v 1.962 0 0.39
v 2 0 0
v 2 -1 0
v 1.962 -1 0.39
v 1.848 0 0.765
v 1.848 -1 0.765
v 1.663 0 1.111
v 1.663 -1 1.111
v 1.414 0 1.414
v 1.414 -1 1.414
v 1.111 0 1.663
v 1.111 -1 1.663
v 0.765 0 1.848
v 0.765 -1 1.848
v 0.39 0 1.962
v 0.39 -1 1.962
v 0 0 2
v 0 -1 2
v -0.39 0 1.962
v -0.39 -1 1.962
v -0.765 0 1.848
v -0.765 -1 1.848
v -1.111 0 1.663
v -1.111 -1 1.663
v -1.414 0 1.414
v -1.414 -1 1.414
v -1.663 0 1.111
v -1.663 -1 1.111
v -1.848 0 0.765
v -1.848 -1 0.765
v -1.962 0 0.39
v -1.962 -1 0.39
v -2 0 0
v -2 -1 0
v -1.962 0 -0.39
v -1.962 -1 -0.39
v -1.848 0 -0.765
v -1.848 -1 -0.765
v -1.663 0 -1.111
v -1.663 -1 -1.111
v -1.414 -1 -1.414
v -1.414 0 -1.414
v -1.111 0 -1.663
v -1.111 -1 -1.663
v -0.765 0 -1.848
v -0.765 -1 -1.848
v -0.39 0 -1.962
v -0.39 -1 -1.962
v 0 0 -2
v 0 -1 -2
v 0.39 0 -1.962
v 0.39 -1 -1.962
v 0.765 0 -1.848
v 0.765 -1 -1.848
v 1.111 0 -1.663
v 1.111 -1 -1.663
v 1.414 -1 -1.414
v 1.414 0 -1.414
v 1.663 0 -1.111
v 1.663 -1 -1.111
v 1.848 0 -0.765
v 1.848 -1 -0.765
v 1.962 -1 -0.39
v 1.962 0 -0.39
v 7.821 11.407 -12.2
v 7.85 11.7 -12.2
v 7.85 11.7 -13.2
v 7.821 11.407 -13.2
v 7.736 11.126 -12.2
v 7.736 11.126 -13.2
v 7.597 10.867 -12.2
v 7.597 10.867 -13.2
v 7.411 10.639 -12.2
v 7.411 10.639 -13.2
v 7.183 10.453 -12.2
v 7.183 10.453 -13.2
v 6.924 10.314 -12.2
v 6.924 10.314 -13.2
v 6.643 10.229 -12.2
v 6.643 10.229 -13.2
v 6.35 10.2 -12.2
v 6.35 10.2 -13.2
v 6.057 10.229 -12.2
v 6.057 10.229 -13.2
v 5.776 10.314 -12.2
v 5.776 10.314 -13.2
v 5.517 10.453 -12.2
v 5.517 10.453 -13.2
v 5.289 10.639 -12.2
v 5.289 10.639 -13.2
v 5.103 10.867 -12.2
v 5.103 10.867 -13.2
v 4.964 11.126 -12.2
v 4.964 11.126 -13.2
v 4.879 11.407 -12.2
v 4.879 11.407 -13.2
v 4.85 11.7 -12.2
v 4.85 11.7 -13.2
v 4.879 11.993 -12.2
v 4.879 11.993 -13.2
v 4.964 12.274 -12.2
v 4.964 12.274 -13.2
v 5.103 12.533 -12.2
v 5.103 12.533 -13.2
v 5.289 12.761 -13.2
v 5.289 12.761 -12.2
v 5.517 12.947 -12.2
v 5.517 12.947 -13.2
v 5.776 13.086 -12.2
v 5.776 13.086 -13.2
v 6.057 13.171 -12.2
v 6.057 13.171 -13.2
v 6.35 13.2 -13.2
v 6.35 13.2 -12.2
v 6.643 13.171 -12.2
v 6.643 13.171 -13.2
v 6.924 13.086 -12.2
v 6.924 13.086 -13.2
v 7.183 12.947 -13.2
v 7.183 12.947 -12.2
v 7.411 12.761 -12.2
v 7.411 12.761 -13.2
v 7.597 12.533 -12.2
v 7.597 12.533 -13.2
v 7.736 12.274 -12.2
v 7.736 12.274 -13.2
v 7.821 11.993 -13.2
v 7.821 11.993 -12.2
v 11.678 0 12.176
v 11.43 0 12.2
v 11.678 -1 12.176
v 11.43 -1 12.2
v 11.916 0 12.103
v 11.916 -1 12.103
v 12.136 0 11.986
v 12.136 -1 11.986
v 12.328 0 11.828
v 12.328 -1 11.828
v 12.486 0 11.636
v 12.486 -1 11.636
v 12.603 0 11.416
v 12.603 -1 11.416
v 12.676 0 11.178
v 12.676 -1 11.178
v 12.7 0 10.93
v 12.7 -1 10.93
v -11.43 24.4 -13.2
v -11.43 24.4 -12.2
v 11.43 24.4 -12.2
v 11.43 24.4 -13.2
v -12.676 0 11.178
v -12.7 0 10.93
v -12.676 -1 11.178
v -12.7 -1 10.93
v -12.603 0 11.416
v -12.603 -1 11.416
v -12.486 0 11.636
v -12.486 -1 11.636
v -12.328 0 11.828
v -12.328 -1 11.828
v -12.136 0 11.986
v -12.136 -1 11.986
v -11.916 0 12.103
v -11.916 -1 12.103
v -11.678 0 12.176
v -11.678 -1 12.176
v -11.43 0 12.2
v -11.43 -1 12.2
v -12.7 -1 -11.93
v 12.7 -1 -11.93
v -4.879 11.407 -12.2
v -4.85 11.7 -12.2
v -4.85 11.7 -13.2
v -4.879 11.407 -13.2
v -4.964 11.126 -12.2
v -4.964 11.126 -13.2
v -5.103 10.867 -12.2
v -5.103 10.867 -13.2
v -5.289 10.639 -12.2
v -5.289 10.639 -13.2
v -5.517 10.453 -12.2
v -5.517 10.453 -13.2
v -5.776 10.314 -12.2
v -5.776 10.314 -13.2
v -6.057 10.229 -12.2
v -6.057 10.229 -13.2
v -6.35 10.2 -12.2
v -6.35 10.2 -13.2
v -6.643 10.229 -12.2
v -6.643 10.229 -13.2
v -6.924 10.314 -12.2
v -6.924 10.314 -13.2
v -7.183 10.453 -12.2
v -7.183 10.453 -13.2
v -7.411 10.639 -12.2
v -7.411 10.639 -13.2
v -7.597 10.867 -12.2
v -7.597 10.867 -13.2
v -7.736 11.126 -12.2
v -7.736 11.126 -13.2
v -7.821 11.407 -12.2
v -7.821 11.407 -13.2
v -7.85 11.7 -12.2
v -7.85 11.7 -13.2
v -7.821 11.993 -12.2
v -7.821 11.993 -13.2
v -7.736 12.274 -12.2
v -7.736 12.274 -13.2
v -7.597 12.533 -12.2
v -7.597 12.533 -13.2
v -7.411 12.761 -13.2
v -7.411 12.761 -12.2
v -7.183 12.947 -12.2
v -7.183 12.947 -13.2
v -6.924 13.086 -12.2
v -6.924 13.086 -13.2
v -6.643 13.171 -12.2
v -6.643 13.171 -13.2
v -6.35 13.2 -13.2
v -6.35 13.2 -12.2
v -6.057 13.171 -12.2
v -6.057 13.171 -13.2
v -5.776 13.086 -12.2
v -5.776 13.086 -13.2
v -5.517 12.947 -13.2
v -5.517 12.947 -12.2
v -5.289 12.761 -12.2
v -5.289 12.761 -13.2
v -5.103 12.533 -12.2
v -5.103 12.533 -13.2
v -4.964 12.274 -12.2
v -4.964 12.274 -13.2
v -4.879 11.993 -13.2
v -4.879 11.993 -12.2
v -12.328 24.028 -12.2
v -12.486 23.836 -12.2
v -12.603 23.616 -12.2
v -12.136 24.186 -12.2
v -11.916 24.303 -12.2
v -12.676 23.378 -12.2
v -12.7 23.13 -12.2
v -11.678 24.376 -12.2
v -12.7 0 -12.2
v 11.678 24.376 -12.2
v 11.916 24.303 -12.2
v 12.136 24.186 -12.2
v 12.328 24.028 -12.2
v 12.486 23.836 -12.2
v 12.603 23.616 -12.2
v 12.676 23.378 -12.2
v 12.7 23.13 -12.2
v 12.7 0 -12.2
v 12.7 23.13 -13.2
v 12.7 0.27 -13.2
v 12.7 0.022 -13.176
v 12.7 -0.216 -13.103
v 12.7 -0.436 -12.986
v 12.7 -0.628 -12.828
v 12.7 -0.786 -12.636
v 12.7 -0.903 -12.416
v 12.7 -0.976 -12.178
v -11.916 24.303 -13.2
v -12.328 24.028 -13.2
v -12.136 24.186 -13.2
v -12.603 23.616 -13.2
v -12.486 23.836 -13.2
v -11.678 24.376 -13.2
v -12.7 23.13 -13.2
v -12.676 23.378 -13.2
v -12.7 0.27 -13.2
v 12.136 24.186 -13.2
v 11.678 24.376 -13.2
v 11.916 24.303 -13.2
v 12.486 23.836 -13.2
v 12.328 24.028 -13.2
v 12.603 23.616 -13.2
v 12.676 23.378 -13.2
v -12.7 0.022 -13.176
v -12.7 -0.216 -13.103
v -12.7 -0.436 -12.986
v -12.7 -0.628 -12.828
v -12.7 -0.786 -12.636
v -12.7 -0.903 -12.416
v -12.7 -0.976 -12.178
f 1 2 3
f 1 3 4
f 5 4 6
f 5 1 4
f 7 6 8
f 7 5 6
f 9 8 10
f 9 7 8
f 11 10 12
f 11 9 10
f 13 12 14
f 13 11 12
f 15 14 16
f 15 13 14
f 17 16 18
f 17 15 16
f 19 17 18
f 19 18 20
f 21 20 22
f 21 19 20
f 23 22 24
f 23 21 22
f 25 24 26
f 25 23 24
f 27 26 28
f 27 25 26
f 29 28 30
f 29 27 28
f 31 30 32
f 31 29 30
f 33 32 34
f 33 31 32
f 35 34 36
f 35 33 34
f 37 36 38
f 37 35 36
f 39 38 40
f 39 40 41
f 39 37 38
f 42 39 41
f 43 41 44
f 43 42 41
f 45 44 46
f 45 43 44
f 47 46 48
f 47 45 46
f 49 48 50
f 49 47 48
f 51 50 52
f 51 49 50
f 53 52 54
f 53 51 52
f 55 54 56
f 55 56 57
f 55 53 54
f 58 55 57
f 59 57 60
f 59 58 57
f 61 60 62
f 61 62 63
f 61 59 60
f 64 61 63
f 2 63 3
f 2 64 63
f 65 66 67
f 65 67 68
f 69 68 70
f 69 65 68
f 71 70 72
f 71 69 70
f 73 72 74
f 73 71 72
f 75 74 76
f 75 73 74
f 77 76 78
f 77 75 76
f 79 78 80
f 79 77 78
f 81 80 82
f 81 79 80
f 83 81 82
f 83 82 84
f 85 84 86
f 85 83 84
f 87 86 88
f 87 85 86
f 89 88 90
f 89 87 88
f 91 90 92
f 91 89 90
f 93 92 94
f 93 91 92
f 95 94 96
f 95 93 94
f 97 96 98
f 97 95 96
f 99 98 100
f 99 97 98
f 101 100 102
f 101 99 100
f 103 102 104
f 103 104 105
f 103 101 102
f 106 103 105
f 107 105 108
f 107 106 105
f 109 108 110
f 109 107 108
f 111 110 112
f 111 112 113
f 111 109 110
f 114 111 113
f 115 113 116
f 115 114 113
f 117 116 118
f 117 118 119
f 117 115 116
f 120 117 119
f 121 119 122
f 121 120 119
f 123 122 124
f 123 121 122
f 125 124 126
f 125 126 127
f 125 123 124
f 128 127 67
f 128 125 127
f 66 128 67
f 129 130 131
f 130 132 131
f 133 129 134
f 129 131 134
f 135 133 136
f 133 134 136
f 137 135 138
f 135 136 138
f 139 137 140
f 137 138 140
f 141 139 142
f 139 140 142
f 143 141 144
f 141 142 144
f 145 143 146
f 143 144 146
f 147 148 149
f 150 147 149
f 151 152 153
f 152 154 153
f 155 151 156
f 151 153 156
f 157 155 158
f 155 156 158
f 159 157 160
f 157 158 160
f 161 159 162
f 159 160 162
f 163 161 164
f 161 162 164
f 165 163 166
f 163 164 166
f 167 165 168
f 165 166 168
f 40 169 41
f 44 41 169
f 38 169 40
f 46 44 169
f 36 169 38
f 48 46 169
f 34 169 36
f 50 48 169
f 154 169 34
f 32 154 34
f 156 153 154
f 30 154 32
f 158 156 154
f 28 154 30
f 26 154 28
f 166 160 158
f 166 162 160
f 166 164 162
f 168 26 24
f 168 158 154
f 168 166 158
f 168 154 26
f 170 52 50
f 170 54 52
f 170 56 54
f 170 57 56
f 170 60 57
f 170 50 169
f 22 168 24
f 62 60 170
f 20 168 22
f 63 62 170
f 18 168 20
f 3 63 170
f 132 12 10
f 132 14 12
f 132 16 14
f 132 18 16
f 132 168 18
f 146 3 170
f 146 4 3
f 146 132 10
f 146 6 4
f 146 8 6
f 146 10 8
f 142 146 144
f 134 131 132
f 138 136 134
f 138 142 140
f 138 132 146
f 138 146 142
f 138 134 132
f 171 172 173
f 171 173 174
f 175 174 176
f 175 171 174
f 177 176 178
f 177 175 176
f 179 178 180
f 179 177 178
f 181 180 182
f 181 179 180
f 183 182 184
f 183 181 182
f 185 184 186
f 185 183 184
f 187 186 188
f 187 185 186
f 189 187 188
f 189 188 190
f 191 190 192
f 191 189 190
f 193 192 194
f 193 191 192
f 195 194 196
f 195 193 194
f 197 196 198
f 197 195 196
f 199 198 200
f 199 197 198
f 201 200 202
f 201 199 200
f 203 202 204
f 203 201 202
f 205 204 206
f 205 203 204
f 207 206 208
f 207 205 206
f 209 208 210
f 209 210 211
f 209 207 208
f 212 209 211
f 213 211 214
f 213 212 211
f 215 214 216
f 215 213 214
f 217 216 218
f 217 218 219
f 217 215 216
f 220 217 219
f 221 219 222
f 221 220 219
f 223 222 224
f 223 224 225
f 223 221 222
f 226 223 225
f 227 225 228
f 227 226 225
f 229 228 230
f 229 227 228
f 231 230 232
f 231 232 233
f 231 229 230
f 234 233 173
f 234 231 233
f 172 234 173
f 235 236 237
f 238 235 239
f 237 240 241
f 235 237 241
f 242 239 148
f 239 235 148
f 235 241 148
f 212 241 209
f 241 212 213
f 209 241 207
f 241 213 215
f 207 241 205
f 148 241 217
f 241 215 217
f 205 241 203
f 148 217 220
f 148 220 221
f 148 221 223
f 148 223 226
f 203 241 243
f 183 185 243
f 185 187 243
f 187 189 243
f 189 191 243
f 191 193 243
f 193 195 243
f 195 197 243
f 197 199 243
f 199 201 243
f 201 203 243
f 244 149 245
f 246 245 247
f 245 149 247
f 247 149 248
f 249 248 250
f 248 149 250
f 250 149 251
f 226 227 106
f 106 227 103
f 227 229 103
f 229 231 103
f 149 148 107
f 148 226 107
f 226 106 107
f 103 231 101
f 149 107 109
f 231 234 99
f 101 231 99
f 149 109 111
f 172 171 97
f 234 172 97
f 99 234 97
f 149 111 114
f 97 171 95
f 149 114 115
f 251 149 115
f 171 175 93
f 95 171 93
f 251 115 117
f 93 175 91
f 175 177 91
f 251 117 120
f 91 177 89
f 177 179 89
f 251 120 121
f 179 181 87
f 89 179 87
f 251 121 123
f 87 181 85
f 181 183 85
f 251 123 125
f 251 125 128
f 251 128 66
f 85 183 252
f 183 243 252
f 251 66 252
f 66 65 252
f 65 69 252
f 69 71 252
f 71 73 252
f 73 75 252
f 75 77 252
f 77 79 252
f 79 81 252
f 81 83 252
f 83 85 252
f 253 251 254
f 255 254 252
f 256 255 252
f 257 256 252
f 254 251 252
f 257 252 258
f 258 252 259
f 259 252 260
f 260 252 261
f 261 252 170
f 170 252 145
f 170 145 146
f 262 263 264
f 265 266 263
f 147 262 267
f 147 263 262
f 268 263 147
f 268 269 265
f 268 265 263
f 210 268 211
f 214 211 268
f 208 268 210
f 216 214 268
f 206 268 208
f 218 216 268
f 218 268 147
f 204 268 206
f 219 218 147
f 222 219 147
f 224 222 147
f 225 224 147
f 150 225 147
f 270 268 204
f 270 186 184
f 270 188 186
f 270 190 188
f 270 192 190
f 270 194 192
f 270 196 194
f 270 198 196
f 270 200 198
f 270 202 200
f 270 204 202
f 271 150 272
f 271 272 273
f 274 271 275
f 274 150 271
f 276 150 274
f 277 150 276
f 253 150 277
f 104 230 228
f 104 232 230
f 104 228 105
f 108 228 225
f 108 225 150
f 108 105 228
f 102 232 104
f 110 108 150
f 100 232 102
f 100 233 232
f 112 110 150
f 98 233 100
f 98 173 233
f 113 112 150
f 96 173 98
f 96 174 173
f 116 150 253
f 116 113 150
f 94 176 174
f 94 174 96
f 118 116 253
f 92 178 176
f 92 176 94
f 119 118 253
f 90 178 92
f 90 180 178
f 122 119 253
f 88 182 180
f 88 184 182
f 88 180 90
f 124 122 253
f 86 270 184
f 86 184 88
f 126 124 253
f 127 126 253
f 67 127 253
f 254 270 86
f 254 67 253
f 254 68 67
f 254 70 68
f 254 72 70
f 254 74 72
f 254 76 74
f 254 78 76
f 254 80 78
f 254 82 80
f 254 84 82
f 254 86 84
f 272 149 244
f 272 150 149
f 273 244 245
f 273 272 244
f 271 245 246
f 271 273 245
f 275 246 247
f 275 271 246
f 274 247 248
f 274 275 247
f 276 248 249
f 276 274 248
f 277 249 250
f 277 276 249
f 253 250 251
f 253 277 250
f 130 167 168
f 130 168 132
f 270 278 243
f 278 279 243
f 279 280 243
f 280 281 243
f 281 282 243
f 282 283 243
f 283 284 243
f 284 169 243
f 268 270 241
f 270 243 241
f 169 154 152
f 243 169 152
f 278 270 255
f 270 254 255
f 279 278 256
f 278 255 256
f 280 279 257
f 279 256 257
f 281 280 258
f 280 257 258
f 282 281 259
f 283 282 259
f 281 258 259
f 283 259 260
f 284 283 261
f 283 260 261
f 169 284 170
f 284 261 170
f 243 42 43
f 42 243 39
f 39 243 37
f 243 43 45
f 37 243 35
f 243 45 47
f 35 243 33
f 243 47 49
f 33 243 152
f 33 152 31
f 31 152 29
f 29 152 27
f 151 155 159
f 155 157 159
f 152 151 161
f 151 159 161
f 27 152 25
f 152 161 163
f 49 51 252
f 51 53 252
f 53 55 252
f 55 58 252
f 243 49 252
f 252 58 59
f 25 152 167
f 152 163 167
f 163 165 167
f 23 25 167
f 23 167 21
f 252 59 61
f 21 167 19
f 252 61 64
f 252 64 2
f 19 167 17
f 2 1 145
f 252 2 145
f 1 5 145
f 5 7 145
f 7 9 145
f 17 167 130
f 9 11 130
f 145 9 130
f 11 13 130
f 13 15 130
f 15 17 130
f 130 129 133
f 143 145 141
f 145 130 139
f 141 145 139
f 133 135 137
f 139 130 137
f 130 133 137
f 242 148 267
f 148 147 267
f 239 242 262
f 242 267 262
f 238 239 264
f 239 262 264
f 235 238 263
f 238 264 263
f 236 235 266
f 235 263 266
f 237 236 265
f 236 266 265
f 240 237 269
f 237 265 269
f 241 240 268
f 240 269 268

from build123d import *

# Parameters (mm, degrees)
F0_W     = 25.4
F0_H     = 24.4
F0_R     = 2
F1_DEPTH = 1
F2_R     = 1.27
F3_W     = 25.4
F3_H     = 24.4
F3_R     = 1.5
F3_H_2   = 1
F4_DEPTH = 1
F5_R     = 1.27


with BuildPart() as f1:
    # F0 (on Front) → F1 (new body)
    with BuildSketch(Plane.XZ):
        Rectangle(F0_W, F0_H)
        Circle(F0_R, mode=Mode.SUBTRACT)
    extrude(amount=F1_DEPTH)

    # F2
    f2_edges = [f1.edges().sort_by_distance(p)[0] for p in [
        (12.7, -0.5, 12.2),
        (-12.7, -0.5, 12.2),
    ]]
    fillet(f2_edges, radius=F2_R)

    # F3 (on face) → F4 (join)
    with BuildSketch(Plane(origin=(0, 0, -12.2), x_dir=(1, 0, 0), z_dir=(0, 0, -1))):
        with Locations((0, -12.2)):
            Rectangle(F3_W, F3_H)
        with Locations((-6.35, -11.7)):
            Circle(F3_R, mode=Mode.SUBTRACT)
        with Locations((6.35, -11.7)):
            Circle(F3_R, mode=Mode.SUBTRACT)
        with Locations((0, 0.5)):
            Rectangle(F3_W, F3_H_2)
    extrude(amount=F4_DEPTH)

    # F5
    f5_edges = [f1.edges().sort_by_distance(p)[0] for p in [
        (0, -1, -13.2),
        (-12.7, 24.4, -12.7),
        (12.7, 24.4, -12.7),
    ]]
    fillet(f5_edges, radius=F5_R)


solid = f1.part
